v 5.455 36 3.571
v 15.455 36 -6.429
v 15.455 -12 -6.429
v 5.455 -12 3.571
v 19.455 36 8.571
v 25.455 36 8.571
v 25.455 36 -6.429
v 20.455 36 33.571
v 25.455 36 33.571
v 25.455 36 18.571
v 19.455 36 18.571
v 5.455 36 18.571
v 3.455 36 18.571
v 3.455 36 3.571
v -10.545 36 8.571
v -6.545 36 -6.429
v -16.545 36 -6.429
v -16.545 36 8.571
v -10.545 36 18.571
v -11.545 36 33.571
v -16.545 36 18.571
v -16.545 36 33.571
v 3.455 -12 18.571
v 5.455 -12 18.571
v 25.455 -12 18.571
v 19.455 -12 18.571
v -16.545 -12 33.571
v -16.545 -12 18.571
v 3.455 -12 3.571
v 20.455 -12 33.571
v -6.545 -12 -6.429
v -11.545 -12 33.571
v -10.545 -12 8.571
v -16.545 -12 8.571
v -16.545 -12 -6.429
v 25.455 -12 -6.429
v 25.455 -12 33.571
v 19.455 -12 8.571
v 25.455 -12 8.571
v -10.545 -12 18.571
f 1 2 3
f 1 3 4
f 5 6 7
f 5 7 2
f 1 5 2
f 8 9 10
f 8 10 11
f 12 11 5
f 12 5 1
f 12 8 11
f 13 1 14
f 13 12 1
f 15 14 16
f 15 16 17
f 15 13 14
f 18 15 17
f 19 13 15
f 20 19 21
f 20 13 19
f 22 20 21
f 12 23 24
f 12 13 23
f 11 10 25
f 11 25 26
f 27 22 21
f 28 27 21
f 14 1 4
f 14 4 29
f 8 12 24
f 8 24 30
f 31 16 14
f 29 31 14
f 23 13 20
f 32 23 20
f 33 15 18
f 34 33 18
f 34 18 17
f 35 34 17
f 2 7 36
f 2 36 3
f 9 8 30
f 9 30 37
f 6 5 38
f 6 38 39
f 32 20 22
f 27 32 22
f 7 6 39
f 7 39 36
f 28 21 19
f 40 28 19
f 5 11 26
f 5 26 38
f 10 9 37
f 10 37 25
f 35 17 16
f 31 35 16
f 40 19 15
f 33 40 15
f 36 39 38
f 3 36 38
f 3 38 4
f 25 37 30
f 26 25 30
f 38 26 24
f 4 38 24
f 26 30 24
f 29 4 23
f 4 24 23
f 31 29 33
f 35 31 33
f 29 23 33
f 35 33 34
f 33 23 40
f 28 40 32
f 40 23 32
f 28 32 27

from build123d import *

# Parameters (mm, degrees)
F1_DEPTH = 12


with BuildPart() as f1:
    # F0 (on Front) → F1 (new body, symmetric)
    with BuildSketch(Plane.XZ):
        Polygon((-16.544905, 8.570568), (-16.544905, -6.429432), (-6.544905, -6.429432), (3.455095, 3.570568), (4.455095, 3.570568), (4.455095, 18.570568), (3.455095, 18.570568), (-11.544905, 33.570568), (-16.544905, 33.570568), (-16.544905, 18.570568), (-10.544905, 18.570568), (-10.544905, 8.570568), align=None)
    extrude(amount=F1_DEPTH, both=True)

    # F2: F1 across face


with BuildPart() as f1_1:
    add(f1.part)
    add(f1.part.mirror(Plane(origin=(-7.082177, 12, 12.065645), x_dir=(1, 0, 0), z_dir=(0, 1, 0))))

    # F3: F1 across face


with BuildPart() as f1_2:
    add(f1_1.part)
    add(f1_1.part.mirror(Plane(origin=(4.455095, 12, 11.070568), x_dir=(0, 1, 0), z_dir=(1, 0, 0))))


solid = f1_2.part
